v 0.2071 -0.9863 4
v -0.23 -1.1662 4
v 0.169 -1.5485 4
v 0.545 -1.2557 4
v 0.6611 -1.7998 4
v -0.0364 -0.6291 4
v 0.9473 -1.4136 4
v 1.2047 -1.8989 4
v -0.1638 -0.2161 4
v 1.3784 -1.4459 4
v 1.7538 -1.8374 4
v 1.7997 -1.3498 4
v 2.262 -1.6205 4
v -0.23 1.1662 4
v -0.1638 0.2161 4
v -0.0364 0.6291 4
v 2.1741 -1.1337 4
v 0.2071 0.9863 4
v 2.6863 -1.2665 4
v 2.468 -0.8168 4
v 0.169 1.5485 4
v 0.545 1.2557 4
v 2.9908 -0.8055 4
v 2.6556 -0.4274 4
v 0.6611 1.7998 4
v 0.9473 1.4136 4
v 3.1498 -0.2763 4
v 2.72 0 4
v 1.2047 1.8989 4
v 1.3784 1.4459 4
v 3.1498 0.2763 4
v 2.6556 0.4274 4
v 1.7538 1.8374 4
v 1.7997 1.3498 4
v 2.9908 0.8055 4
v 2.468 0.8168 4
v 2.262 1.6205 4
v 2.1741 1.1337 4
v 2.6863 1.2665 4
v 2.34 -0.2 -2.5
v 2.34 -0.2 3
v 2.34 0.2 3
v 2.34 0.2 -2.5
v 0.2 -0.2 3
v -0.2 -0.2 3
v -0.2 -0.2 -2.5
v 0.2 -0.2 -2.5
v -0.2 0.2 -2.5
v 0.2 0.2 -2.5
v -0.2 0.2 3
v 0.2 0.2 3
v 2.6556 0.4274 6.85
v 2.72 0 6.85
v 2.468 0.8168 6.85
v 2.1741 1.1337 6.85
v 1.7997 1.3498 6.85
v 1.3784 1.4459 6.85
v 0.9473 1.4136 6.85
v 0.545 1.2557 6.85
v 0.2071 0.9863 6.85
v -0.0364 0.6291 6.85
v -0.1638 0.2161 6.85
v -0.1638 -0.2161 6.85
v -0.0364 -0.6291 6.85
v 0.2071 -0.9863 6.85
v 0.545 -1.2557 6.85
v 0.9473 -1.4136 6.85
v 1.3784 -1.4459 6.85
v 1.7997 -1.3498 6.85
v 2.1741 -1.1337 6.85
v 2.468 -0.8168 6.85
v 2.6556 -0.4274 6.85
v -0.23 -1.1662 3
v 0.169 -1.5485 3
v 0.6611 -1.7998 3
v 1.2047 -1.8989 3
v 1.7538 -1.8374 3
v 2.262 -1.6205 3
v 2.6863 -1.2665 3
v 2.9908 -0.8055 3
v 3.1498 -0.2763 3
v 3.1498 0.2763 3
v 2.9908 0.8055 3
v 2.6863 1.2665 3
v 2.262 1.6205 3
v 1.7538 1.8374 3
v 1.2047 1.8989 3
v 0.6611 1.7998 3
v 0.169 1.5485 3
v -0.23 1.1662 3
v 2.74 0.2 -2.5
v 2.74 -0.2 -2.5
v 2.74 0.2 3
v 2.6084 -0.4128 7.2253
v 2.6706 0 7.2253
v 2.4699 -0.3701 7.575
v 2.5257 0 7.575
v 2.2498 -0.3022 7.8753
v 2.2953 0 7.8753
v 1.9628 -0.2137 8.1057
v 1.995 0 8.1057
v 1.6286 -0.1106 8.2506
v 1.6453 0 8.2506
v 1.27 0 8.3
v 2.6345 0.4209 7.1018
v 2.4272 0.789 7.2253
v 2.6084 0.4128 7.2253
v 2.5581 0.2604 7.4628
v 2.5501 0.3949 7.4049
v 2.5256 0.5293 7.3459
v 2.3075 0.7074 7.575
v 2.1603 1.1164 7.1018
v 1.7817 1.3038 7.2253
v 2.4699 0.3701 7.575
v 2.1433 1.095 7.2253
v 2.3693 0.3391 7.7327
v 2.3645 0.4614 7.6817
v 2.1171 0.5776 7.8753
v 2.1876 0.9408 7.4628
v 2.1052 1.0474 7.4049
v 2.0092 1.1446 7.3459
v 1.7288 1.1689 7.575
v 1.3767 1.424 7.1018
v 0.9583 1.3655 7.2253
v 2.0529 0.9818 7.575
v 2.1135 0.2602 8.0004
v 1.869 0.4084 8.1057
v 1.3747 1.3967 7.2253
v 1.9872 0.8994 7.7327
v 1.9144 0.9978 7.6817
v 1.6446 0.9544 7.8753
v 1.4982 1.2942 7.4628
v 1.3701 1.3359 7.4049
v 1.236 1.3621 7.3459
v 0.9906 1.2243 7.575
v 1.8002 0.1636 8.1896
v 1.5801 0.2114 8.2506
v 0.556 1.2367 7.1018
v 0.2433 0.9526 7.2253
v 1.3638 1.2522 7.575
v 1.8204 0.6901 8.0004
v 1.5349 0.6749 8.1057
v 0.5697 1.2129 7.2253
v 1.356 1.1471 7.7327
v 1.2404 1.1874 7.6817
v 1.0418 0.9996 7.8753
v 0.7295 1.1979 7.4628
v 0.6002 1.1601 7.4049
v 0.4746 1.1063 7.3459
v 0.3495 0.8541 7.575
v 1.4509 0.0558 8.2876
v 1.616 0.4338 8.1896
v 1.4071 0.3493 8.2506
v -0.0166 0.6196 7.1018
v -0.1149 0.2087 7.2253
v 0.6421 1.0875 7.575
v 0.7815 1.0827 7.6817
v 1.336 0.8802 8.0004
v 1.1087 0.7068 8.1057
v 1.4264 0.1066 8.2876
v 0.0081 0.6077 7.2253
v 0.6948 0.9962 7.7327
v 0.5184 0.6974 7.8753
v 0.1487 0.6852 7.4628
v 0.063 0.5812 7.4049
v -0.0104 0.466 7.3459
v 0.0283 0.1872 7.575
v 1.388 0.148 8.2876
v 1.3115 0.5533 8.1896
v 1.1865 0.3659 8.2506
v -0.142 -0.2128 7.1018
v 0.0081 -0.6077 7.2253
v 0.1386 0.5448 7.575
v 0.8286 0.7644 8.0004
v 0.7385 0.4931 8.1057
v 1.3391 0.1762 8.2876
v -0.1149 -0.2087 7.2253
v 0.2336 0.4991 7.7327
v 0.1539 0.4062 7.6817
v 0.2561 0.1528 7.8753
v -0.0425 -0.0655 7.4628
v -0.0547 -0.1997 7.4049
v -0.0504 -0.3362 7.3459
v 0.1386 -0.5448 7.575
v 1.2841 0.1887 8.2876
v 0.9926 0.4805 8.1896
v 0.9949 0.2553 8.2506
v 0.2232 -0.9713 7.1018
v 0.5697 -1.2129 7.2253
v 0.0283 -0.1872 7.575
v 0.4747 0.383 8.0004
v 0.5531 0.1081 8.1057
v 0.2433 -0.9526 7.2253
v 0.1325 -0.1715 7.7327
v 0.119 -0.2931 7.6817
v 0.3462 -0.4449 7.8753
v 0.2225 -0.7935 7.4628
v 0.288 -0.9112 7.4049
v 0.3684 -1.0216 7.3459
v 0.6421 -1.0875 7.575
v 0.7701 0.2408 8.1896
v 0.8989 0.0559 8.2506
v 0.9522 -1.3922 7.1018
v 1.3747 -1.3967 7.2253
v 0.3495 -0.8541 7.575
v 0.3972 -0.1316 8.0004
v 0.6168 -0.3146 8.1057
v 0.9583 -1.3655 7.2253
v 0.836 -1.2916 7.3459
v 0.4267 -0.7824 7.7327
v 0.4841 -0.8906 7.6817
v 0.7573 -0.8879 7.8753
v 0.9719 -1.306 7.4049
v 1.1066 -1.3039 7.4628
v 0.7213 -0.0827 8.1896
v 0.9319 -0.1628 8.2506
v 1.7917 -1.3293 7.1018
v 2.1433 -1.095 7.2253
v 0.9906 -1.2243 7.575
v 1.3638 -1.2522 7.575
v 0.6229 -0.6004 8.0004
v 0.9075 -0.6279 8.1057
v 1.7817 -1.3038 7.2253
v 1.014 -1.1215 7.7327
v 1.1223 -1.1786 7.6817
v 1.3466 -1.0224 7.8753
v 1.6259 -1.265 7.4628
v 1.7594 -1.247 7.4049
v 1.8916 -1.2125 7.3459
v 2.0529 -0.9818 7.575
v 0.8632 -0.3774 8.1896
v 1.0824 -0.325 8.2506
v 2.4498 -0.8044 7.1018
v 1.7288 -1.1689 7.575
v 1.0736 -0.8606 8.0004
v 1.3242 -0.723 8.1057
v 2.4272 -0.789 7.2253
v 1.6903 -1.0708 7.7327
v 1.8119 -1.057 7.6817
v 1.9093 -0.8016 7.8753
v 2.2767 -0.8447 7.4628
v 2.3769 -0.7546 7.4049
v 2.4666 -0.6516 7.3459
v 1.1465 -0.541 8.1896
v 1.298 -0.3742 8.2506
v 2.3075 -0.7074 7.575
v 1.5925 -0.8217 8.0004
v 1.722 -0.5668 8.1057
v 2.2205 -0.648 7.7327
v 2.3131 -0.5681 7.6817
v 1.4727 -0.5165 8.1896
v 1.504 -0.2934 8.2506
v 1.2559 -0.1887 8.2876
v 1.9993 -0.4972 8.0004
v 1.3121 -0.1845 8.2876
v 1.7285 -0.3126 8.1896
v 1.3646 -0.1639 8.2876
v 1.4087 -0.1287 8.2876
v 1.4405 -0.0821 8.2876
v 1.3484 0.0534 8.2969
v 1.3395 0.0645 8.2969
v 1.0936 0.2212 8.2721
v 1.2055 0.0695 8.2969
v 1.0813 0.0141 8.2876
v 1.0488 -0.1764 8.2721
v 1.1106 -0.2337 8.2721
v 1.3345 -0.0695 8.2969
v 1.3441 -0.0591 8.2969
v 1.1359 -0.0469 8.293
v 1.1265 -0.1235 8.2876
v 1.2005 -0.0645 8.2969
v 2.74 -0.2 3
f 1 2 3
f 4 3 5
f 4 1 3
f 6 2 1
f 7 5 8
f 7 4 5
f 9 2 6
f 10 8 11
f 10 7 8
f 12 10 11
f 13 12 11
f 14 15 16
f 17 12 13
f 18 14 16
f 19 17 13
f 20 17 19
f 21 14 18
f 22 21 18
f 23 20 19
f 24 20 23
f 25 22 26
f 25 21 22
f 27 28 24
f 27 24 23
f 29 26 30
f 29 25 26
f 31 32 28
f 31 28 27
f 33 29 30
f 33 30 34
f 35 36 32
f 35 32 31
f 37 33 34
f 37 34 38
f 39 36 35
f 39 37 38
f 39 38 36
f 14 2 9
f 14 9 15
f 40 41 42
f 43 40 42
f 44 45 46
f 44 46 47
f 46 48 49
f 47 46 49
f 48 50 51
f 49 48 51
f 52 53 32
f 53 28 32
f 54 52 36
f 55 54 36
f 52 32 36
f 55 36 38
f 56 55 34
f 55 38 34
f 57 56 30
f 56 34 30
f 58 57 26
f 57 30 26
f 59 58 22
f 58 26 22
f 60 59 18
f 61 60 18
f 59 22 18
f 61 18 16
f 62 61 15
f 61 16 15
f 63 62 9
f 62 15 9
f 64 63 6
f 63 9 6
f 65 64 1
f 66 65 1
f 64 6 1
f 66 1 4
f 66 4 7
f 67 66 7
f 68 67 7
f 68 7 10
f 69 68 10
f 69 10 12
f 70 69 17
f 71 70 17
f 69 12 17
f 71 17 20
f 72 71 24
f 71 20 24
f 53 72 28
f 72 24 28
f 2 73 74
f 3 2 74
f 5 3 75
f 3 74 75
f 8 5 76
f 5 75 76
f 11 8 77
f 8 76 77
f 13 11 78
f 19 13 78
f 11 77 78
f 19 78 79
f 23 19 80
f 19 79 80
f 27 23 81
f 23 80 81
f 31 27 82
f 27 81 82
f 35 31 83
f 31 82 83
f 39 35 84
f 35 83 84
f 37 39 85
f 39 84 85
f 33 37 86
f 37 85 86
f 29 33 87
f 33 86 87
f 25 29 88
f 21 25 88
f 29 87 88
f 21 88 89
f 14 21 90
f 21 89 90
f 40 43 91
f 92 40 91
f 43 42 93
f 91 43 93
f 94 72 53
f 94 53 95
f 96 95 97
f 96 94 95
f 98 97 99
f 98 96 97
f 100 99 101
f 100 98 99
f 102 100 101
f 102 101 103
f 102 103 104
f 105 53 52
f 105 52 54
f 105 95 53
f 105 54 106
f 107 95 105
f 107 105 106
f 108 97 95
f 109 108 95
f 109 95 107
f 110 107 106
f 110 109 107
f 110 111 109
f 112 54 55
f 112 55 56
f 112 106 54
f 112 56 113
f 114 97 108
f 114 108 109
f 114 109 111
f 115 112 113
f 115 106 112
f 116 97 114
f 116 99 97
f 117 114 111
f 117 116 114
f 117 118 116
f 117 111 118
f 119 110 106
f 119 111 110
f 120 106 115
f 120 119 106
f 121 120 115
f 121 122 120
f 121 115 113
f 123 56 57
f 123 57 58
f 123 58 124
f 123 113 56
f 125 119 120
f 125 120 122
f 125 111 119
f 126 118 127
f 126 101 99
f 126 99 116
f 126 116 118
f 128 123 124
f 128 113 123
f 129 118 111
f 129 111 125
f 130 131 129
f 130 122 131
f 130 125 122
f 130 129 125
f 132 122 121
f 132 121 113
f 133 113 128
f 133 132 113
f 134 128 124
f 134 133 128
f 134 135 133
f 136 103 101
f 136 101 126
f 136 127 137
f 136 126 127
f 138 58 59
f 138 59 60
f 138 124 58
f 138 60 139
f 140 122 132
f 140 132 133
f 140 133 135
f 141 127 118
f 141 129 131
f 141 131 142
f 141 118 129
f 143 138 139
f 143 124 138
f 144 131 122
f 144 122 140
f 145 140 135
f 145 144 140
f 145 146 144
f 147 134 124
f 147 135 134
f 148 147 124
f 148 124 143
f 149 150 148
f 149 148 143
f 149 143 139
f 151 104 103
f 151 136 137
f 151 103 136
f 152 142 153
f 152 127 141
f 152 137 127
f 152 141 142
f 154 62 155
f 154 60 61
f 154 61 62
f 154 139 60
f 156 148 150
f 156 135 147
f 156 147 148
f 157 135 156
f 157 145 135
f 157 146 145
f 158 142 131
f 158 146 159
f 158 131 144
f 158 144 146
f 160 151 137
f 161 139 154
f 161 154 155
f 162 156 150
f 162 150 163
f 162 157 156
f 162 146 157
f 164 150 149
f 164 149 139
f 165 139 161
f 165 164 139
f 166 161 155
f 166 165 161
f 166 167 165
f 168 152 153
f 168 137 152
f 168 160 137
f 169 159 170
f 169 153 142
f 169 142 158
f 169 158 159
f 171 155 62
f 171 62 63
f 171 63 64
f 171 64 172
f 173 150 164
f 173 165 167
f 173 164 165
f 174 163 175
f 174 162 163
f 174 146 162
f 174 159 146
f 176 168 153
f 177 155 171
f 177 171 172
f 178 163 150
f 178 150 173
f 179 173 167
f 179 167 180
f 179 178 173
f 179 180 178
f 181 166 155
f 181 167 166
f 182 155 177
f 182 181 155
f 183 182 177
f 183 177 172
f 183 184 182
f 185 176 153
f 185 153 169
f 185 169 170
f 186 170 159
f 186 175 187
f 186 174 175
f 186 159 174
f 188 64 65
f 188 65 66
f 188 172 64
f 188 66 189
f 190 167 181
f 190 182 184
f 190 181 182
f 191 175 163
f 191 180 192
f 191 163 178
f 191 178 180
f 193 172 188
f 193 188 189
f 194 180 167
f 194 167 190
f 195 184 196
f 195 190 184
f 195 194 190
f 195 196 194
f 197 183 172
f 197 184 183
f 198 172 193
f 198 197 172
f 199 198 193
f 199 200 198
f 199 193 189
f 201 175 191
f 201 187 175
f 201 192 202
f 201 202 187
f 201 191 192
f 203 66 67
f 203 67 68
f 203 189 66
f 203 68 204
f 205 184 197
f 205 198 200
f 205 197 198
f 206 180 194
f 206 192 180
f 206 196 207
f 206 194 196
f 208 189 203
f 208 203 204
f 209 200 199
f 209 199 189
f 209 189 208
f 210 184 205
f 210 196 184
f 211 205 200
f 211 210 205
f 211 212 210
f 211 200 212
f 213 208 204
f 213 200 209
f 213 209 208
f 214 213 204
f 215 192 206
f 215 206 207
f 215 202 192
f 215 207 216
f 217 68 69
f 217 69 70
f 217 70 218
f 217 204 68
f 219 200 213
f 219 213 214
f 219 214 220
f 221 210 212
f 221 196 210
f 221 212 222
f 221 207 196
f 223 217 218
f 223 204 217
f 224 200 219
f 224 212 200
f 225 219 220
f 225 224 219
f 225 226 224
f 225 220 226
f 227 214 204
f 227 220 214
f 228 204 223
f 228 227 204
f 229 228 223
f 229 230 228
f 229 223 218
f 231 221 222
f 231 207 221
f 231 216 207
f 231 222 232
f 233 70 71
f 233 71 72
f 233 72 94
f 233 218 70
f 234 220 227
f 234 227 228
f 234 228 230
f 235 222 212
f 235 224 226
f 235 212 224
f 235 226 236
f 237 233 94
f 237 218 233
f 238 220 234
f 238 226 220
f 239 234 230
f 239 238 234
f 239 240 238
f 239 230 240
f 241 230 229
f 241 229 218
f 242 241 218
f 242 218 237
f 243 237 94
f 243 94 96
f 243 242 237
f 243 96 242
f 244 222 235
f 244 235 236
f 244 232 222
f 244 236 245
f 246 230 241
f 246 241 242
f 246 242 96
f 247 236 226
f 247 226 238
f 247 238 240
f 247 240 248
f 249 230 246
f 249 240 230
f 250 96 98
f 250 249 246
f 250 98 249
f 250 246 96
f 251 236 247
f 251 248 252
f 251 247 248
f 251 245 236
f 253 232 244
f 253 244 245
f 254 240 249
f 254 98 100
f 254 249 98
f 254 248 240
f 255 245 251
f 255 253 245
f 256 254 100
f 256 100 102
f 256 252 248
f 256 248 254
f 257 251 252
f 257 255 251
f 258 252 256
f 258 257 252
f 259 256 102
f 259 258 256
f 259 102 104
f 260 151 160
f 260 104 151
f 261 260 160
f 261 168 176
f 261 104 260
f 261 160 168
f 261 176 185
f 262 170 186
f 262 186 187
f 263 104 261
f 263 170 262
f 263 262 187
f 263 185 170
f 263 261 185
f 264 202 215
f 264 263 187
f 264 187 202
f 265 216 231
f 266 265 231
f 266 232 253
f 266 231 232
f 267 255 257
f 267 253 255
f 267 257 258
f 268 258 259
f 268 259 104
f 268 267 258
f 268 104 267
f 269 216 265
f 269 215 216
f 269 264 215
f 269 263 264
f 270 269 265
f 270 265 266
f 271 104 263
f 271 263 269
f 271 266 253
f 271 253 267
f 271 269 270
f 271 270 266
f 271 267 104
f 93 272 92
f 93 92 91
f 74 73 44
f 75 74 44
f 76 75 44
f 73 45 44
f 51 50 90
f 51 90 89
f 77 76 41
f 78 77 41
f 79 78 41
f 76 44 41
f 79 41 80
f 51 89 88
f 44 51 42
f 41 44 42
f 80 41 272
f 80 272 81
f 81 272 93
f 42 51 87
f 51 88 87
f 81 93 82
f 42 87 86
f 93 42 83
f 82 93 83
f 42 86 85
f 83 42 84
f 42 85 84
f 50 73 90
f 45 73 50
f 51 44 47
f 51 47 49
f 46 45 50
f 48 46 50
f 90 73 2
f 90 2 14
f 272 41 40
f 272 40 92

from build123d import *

# Parameters (mm, degrees)
PAD_DEPTH    = 1
SKETCH002_W  = 0.4
SKETCH002_H  = 0.4
PAD001_DEPTH = 6
SKETCH003_W  = 2.84
SKETCH003_H  = 0.4
PAD002_DEPTH = 1


with BuildPart() as pad:
    # Sketch001 → Pad (new body)
    with BuildSketch(Plane(origin=(1.27, 0, 3), x_dir=(1, 0, 0), z_dir=(0, 0, 1))):
        with BuildLine():
            ThreePointArc((-1.5, -1.16619), (1.9, 0), (-1.5, 1.16619))
            Line((-1.5, -1.16619), (-1.5, 1.16619))
        make_face()
    extrude(amount=PAD_DEPTH)


with BuildPart() as pad001:
    # Sketch002 → Pad001 (new body)
    with BuildSketch(Plane.XY.offset(3.5)):
        Rectangle(SKETCH002_W, SKETCH002_H)
        with Locations((2.54, 0)):
            Rectangle(SKETCH002_W, SKETCH002_H)
    extrude(amount=-PAD001_DEPTH)


with BuildPart() as pad002:
    # Sketch003 → Pad002 (new body)
    with BuildSketch(Plane.XY.offset(3.5)):
        with Locations((1.27, 0)):
            Rectangle(SKETCH003_W, SKETCH003_H)
    extrude(amount=PAD002_DEPTH)


with BuildPart() as revolution001:
    # Sketch004 → Revolution001 (revolve)
    with BuildSketch(Plane.XZ):
        Polygon((1.27, 4.275), (0.82, 4.725), (1.27, 4.725), align=None)
    revolve(axis=Axis((1.27, 0, 5.374987), (0, 0, -1)))


with BuildPart() as led_d3_0mm:
    # Sketch → Revolution (revolve)
    with BuildSketch(Plane(origin=(1.27, 0, 0), x_dir=(1, 0, 0), z_dir=(0, -1, 0))):
        with BuildLine():
            ThreePointArc((1.45, 6.85), (1.025305, 7.875305), (0, 8.3))
            Line((0, 4), (0, 8.3))
            Line((1.45, 4), (0, 4))
            Line((1.45, 6.85), (1.45, 4))
        make_face()
    revolve(axis=Axis((1.27, 0, 0), (0, 0, 1)))

    # Revolution_mp_cp: union Pad, Pad001, Pad002, Revolution001
    add(pad.part)
    add(pad001.part)
    add(pad002.part)
    add(revolution001.part)


solid = led_d3_0mm.part
